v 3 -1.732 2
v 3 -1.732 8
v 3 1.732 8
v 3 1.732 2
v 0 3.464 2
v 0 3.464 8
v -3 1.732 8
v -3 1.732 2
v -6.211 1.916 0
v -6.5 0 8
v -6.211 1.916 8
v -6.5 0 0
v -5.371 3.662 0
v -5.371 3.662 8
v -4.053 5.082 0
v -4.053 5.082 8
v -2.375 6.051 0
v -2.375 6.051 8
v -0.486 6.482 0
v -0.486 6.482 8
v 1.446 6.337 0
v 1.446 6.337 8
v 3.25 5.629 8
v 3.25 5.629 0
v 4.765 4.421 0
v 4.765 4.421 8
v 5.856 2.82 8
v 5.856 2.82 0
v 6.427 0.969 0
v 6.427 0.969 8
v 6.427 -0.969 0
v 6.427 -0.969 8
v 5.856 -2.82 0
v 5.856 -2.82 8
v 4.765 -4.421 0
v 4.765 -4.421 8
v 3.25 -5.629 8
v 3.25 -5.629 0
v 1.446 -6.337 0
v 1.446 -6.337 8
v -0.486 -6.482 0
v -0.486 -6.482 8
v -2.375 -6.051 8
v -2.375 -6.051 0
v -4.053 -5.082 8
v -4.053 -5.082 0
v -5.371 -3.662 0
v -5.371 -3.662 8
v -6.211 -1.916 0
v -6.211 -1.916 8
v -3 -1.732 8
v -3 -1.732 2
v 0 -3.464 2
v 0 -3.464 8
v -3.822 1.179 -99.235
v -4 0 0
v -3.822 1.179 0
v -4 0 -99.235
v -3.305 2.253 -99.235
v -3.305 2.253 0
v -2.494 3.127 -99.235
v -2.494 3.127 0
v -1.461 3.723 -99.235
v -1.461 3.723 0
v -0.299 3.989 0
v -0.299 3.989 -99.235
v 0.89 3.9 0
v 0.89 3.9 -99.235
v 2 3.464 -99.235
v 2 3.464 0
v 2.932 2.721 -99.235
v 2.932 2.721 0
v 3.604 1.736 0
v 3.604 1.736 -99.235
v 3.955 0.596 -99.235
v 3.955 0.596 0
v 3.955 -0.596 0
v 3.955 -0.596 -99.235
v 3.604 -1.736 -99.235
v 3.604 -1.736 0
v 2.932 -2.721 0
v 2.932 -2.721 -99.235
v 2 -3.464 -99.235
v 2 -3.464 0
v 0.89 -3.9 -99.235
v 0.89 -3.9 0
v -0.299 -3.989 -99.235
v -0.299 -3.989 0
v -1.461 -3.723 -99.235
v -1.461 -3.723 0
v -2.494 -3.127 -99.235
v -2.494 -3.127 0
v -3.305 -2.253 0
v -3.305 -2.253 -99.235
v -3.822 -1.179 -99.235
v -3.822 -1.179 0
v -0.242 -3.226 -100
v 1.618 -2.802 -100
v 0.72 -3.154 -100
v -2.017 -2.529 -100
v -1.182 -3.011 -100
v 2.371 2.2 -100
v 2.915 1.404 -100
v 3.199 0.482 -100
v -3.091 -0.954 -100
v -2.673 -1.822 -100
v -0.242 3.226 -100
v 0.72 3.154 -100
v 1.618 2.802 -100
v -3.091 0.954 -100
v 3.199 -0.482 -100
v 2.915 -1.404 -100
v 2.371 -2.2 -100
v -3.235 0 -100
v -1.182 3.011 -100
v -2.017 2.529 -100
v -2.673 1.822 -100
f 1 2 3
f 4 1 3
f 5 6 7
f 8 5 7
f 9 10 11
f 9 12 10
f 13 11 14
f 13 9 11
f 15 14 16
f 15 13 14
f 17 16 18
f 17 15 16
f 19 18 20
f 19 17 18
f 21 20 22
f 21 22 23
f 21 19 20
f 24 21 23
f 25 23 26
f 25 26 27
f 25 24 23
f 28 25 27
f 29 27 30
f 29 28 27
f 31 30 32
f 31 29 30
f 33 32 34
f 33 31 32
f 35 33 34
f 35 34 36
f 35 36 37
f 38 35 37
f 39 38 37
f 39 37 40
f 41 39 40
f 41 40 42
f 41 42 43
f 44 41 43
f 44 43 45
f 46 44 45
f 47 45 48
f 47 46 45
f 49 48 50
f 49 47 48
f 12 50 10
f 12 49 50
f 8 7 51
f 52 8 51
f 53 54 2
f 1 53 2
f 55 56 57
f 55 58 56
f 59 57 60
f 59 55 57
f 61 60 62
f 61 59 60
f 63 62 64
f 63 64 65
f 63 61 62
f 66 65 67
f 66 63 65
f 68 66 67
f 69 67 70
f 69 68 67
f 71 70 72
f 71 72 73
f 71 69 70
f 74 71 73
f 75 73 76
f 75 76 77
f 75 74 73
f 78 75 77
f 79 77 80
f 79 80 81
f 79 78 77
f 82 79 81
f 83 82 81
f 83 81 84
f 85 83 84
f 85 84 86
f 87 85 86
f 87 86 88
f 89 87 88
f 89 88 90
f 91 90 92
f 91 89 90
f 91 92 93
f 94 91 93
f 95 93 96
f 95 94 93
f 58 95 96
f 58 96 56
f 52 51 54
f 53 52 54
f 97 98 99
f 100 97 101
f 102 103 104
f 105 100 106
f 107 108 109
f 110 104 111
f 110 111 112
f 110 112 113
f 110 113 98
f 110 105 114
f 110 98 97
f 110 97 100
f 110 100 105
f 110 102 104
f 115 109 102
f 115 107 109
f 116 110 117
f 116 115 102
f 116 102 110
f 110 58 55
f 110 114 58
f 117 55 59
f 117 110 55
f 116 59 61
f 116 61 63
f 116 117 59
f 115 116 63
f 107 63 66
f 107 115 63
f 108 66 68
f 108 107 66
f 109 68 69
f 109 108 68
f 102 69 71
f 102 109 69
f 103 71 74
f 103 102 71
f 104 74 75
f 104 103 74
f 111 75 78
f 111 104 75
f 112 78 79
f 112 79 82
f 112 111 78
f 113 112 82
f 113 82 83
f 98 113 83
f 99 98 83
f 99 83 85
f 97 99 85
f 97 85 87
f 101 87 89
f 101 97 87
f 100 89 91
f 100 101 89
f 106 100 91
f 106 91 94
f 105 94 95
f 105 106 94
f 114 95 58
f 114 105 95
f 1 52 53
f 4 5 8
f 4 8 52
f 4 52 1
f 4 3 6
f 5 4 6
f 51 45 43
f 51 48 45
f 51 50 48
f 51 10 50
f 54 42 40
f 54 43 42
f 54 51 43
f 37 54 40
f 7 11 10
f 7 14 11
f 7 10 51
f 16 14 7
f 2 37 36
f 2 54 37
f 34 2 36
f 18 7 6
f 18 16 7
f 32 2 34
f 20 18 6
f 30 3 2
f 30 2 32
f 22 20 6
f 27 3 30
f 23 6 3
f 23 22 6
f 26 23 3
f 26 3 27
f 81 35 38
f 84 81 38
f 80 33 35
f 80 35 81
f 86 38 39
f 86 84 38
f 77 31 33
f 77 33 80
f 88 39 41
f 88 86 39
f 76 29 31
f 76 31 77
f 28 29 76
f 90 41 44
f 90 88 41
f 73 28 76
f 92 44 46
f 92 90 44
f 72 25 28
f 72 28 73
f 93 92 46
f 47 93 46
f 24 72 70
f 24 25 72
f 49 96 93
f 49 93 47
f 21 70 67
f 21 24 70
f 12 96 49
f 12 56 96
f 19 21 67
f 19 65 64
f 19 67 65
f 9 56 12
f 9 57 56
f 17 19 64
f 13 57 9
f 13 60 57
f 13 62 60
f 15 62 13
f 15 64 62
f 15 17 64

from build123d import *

# Parameters (mm, degrees)
F4_DEPTH      = 6
F4_DEPTH_BACK = 6


with BuildPart() as f1:
    # F0 (on Front) → F1 (revolve)
    with BuildSketch(Plane.XZ):
        Polygon((0, 8), (-6.5, 8), (-6.5, 0), (-4, 0), (-4, -99.235), (-3.235, -100), (0, -100), align=None)
    revolve(axis=Axis((0, 0, -46), (0, 0, -1)))

    # F3 (on offset) → F4 (cut, two sides)
    with BuildSketch(Plane.XY.offset(8)) as f4_sk:
        Polygon((3, -1.732051), (3, 1.732051), (0, 3.464102), (-3, 1.732051), (-3, -1.732051), (0, -3.464102), align=None)
    extrude(amount=-F4_DEPTH, mode=Mode.SUBTRACT)
    extrude(f4_sk.sketch, amount=-F4_DEPTH_BACK, mode=Mode.SUBTRACT)


solid = f1.part
